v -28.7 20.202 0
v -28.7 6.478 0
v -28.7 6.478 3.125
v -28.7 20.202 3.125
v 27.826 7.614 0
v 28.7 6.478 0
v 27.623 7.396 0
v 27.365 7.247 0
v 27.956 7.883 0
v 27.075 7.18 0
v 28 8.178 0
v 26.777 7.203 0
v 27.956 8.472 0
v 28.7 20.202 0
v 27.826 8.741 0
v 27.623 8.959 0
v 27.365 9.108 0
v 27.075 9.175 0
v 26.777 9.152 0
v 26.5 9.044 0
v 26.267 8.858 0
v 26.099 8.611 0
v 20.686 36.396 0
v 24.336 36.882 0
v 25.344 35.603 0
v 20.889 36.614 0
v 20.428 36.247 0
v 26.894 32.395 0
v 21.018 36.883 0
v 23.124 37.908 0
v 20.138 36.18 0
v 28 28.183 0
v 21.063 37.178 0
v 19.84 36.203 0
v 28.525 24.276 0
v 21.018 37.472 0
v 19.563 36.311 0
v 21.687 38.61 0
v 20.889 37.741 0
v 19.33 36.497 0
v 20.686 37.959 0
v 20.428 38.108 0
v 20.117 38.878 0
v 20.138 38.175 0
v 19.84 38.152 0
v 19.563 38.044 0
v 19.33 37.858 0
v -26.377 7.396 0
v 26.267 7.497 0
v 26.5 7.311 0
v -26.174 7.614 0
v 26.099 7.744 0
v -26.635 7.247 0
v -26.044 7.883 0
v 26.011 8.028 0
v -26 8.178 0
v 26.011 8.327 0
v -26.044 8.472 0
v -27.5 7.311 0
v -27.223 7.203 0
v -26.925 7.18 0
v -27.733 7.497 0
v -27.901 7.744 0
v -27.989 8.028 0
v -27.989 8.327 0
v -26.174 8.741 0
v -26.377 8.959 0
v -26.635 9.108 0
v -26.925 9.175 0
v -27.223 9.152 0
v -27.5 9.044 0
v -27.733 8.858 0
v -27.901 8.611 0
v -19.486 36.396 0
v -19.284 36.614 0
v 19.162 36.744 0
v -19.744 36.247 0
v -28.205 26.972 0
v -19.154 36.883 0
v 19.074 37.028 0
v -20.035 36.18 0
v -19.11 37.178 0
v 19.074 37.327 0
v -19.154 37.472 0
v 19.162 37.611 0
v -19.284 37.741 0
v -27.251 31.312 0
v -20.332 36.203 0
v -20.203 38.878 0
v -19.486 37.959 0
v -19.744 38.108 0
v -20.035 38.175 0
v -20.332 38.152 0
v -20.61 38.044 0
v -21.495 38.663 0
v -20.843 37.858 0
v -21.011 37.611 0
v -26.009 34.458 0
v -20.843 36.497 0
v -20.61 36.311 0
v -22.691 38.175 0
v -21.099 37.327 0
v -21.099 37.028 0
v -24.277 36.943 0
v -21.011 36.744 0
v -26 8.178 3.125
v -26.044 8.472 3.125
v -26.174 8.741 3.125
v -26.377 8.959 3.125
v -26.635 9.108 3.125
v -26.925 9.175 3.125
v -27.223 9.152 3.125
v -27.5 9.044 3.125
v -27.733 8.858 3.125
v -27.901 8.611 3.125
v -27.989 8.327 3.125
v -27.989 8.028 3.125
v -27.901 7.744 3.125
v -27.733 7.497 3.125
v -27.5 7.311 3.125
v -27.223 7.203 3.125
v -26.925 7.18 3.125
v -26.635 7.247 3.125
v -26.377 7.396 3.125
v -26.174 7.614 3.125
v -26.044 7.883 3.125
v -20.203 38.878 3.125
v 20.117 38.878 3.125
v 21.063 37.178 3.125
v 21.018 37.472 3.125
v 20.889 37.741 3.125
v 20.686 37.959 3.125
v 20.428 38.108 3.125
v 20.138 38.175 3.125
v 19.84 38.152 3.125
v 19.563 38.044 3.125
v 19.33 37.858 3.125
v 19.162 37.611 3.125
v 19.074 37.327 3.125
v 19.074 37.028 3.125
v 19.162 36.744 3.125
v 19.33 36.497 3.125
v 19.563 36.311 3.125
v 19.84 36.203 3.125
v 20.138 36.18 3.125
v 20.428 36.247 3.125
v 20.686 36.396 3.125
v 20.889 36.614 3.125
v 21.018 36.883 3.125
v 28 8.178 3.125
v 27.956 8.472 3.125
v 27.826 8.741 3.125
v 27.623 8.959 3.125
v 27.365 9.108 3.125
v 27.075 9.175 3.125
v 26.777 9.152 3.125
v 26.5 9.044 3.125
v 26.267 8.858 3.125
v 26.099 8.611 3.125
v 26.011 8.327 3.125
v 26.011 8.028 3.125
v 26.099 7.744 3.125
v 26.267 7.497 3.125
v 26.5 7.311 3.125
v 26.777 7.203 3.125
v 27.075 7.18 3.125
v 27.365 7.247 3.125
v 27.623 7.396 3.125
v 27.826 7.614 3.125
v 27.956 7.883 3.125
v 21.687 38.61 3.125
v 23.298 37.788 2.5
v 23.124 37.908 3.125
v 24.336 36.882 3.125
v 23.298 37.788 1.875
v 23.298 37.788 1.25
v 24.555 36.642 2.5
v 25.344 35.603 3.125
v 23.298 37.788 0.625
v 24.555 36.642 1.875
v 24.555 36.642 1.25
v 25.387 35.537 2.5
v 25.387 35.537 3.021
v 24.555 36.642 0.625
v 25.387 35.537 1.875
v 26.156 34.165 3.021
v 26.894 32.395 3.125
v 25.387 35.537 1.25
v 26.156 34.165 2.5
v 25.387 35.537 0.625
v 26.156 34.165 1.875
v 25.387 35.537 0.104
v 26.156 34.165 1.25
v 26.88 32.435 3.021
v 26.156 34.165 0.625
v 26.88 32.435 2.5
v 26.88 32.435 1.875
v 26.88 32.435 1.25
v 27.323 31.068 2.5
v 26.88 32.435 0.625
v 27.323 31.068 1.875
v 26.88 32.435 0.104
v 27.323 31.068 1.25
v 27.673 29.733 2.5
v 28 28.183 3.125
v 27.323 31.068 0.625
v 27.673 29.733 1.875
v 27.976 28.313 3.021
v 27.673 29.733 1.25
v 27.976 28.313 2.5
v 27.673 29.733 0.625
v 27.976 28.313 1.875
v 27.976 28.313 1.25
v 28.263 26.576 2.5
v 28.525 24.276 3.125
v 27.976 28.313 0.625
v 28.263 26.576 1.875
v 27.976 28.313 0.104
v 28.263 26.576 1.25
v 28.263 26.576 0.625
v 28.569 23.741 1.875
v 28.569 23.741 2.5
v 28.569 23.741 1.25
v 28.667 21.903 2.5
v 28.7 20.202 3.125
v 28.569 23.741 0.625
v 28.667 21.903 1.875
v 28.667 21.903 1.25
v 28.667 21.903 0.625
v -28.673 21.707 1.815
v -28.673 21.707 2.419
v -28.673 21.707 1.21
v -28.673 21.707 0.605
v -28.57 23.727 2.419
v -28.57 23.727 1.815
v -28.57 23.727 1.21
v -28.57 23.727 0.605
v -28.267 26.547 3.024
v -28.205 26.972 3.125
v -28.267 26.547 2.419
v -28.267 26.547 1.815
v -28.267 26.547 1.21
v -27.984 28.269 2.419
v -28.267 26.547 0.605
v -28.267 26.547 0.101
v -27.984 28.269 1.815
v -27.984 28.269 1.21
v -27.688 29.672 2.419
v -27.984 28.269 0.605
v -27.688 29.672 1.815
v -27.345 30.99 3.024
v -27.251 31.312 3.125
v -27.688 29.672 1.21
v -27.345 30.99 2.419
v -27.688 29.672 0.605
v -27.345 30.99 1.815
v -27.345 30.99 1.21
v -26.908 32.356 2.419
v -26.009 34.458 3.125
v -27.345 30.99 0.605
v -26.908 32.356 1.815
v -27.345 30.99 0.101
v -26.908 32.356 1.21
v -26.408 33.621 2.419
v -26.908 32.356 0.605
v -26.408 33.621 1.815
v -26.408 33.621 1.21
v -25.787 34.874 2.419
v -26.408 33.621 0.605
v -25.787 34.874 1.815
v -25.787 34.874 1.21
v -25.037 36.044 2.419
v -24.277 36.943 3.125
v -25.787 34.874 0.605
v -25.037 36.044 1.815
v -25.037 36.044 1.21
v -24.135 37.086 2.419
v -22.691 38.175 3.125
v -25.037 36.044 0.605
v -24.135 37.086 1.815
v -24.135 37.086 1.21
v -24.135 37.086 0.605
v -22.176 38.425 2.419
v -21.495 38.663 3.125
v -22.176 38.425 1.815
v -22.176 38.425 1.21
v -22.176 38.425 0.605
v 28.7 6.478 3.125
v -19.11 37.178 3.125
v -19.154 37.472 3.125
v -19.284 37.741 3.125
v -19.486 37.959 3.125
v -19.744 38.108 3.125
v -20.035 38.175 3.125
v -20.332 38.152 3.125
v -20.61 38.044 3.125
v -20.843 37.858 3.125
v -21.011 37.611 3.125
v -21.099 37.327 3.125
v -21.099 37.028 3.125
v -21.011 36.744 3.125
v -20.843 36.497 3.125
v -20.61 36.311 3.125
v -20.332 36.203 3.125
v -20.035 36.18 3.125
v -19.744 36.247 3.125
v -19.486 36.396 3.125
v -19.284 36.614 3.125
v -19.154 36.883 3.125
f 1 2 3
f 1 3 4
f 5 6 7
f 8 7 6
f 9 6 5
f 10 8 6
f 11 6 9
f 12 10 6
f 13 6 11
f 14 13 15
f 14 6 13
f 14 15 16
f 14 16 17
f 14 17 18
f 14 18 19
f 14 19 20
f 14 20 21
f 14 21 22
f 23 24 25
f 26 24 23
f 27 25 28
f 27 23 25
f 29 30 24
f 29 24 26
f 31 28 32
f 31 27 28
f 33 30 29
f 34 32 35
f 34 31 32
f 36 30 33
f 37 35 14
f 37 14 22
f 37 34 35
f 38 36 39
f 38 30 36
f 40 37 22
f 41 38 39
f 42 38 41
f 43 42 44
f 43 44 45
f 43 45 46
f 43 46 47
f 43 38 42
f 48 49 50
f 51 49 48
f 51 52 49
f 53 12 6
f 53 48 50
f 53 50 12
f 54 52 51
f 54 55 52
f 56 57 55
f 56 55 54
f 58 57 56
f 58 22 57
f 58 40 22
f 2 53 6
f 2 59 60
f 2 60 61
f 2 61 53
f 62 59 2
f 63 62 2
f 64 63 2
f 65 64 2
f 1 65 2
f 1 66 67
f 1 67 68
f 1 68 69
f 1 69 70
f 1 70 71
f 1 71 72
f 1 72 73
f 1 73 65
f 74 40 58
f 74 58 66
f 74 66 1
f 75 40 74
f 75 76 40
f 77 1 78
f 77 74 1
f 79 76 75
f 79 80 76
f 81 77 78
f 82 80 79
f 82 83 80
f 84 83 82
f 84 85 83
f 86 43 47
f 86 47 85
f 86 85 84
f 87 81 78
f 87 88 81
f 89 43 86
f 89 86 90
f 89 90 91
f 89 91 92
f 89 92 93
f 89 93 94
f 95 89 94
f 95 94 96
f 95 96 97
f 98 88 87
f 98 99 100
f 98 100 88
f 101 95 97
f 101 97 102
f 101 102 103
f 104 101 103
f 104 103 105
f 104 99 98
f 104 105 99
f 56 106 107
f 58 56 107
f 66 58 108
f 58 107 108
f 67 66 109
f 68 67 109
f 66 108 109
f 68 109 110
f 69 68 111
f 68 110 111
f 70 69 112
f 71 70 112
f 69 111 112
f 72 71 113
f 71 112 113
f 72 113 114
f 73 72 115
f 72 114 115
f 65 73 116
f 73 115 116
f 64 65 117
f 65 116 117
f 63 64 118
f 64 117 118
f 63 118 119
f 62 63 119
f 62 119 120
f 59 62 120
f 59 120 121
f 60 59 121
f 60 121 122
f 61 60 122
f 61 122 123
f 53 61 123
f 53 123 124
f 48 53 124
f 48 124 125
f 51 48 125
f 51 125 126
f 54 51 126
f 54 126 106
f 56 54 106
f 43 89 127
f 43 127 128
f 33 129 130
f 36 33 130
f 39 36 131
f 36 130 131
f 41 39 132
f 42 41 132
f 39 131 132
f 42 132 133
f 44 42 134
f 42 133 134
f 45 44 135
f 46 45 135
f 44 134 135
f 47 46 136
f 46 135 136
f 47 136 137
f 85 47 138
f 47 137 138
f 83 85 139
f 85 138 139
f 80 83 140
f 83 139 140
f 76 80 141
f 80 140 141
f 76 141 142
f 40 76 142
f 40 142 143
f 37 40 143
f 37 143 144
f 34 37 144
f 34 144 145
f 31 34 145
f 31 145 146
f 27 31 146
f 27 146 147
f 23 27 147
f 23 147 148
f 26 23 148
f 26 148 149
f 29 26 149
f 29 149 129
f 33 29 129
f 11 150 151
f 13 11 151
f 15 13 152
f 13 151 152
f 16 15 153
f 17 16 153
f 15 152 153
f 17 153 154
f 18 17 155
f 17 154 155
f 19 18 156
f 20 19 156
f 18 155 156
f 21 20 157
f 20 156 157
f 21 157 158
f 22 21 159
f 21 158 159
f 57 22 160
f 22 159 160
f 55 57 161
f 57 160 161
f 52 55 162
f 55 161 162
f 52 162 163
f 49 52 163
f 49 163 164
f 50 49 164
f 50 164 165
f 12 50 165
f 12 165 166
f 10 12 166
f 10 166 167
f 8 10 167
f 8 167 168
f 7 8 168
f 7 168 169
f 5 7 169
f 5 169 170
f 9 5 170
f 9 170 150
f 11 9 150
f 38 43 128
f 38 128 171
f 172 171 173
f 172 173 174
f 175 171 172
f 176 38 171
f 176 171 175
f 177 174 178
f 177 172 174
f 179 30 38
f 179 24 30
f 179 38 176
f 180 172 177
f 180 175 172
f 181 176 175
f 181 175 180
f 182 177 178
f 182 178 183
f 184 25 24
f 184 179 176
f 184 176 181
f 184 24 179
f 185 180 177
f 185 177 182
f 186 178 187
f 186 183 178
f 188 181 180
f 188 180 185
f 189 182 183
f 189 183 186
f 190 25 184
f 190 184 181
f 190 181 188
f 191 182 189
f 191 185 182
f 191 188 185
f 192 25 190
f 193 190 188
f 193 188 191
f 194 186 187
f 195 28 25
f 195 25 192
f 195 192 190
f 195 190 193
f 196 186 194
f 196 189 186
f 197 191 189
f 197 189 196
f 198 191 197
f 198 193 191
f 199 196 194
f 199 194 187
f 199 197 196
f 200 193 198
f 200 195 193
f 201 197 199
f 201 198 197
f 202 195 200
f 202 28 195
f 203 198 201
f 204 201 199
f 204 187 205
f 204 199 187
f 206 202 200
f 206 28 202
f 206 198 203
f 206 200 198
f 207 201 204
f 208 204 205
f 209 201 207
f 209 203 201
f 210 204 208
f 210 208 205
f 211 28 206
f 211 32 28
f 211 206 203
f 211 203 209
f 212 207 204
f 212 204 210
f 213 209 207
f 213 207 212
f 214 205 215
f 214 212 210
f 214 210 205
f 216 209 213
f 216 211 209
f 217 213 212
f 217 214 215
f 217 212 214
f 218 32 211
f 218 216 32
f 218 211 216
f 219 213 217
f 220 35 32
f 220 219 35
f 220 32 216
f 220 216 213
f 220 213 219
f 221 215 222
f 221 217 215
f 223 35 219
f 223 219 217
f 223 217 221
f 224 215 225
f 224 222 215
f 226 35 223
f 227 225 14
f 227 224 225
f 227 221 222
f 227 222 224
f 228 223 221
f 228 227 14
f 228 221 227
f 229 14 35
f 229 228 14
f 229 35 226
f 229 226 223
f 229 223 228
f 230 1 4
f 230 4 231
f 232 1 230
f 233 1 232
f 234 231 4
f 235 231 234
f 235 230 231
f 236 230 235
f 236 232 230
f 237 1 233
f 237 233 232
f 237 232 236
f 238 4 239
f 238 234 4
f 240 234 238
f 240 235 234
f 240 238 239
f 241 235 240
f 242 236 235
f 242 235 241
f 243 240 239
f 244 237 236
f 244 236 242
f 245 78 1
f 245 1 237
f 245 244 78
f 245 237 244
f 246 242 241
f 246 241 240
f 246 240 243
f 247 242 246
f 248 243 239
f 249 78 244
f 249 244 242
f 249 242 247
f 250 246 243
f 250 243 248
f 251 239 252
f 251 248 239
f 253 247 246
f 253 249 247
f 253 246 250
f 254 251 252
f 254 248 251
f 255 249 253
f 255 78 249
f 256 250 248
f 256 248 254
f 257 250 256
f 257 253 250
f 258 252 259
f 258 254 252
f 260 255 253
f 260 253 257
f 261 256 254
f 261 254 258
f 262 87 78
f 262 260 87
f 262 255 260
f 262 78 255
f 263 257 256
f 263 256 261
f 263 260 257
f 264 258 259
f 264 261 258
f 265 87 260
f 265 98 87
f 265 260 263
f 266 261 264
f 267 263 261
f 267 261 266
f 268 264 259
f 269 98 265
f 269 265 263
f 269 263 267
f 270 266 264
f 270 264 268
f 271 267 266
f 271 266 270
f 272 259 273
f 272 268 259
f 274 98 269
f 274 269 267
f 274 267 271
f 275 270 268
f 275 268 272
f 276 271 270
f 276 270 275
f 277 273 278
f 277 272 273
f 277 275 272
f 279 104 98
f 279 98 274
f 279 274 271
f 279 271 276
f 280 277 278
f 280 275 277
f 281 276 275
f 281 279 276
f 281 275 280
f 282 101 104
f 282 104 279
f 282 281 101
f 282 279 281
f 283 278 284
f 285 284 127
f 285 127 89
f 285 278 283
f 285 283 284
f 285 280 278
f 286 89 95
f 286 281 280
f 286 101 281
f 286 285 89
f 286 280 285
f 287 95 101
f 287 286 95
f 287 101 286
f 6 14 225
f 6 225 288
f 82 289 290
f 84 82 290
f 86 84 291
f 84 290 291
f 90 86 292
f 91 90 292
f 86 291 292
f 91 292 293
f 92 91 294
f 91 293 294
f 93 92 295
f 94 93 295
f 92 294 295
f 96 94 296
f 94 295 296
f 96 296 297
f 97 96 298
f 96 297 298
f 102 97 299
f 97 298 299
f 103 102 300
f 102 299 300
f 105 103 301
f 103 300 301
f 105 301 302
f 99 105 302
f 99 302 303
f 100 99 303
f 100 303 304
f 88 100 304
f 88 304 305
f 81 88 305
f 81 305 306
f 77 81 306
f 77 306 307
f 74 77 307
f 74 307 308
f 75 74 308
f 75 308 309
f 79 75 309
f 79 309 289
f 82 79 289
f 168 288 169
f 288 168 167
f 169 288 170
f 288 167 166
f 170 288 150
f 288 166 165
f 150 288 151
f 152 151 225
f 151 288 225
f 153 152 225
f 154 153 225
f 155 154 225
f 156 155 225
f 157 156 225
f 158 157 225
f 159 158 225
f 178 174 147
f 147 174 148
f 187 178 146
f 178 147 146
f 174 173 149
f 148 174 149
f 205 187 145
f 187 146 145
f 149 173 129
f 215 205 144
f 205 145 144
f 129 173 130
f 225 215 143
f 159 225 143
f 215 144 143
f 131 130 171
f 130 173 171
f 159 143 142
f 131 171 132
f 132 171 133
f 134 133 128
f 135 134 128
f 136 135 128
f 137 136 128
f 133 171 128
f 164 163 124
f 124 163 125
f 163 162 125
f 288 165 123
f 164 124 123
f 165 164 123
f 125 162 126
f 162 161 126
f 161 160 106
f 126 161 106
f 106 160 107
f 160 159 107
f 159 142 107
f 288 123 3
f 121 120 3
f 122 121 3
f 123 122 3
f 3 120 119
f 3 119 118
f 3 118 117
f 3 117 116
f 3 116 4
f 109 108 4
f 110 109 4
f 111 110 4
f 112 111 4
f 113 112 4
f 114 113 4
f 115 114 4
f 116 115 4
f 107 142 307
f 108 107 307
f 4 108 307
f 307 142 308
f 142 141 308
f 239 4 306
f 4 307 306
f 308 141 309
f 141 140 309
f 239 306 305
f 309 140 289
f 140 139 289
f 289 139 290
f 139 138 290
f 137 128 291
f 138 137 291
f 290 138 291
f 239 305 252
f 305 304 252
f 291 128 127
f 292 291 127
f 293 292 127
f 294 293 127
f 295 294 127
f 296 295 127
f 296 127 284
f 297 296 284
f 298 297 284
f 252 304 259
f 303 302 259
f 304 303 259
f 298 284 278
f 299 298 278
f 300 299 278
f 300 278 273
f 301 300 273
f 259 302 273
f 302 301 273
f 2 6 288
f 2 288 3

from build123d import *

# Parameters (mm, degrees)
BOSS_EXTRUDE1_DEPTH = 3.125
SKETCH2_R           = 1
CUT_EXTRUDE1_DEPTH  = 4.1250001


with BuildPart() as part:
    # Sketch1 → Boss-Extrude1 (new body)
    with BuildSketch(Plane.XY):
        with BuildLine():
            Line((-20.203129901, 38.877510312), (20.117155087, 38.877510312))
            add(Edge.make_bspline(
                [(20.117155087, 38.877510312), (21.156749182, 38.850767463), (22.735886033, 38.191125375), (23.719947817, 37.486220747), (24.317353218, 36.912931858), (24.792221965, 36.370922804), (25.193772441, 35.834092453), (25.580242779, 35.238947111), (25.880693088, 34.70853854), (26.075964251, 34.329555217), (26.27578321, 33.917456134), (26.50283091, 33.407963298), (26.759971615, 32.767993983), (27.000050863, 32.102166694), (27.232629316, 31.379979175), (27.41356127, 30.755323796), (27.590811467, 30.080987437), (27.755431361, 29.385748212), (27.912775159, 28.644354852), (28.03910053, 27.980953625), (28.187039057, 27.115480867), (28.36478274, 25.857510545), (28.514705173, 24.455074496), (28.609846111, 23.205425502), (28.647832076, 22.444063797), (28.662990893, 22.038674751), (28.670134973, 21.812401374), (28.675595709, 21.613399304), (28.678245622, 21.502621455), (28.682159819, 21.324092236), (28.692138153, 20.796374144), (28.7, 20.201919543)],
                knots=[0.00028808, 0.00028808, 0.00028808, 0.094004972, 0.1564829, 0.203341346, 0.23458031, 0.265819274, 0.297058238, 0.328297202, 0.351726425, 0.367345907, 0.39077513, 0.422014094, 0.453253058, 0.484492022, 0.515730986, 0.54696995, 0.578208914, 0.609447878, 0.640686842, 0.671925806, 0.718784252, 0.78126218, 0.843740108, 0.890598554, 0.914027777, 0.925742389, 0.93355213, 0.941361871, 0.949171612, 0.960886223, 0.999934928, 0.999934928, 0.999934928], degree=2))
            Line((28.7, 20.201919543), (28.7, 6.477510312))
            Line((28.7, 6.477510312), (-28.7, 6.477510312))
            Line((-28.7, 6.477510312), (-28.7, 20.201963546))
            add(Edge.make_bspline(
                [(-28.7, 20.201963546), (-28.692153994, 20.794156459), (-28.682233134, 21.319666669), (-28.678344818, 21.497465649), (-28.675719654, 21.607561496), (-28.670287973, 21.806287867), (-28.663195669, 22.031980185), (-28.648165574, 22.436044498), (-28.610616915, 23.192828113), (-28.516251433, 24.438176441), (-28.367453676, 25.834827406), (-28.192228084, 27.081685513), (-28.046559562, 27.939579815), (-27.922133003, 28.597483896), (-27.768098497, 29.328930146), (-27.606982401, 30.015782704), (-27.433563779, 30.682500172), (-27.257332943, 31.29834509), (-27.02692461, 32.023081071), (-26.789775764, 32.689408082), (-26.535986502, 33.329426687), (-26.279546608, 33.913339435), (-25.947227657, 34.587755578), (-25.626984432, 35.161228543), (-25.234153605, 35.776093613), (-24.838872765, 36.312799127), (-24.37687249, 36.849479287), (-23.771614433, 37.440093914), (-22.81027432, 38.154312676), (-21.778778312, 38.593984534), (-21.23657709, 38.729347669), (-20.629937031, 38.842543263), (-20.203129901, 38.877510312)],
                knots=[6.5431e-05, 6.5431e-05, 6.5431e-05, 0.039109453, 0.05082266, 0.058631465, 0.066440269, 0.074249074, 0.08596228, 0.109388694, 0.15624152, 0.218711956, 0.281182392, 0.328035219, 0.359270437, 0.390505655, 0.421740872, 0.45297609, 0.484211308, 0.515446526, 0.546681744, 0.577916962, 0.60915218, 0.640387398, 0.671622615, 0.702857833, 0.734093051, 0.765328269, 0.796563487, 0.843416314, 0.90588675, 0.944930772, 0.960548381, 0.999592403, 0.999592403, 0.999592403], degree=2))
        make_face()
    extrude(amount=BOSS_EXTRUDE1_DEPTH)

    # Sketch2 → Cut-Extrude1 (cut, through all)
    with BuildSketch(Plane.XY.offset(3.125)):
        with Locations((-27, 8.177510312)):
            Circle(SKETCH2_R)
        with Locations((-20.109740551, 37.177510312)):
            Circle(SKETCH2_R)
        with Locations((20.062840726, 37.177510312)):
            Circle(SKETCH2_R)
        with Locations((27, 8.177510312)):
            Circle(SKETCH2_R)
    extrude(amount=-CUT_EXTRUDE1_DEPTH, mode=Mode.SUBTRACT)


solid = part.part
